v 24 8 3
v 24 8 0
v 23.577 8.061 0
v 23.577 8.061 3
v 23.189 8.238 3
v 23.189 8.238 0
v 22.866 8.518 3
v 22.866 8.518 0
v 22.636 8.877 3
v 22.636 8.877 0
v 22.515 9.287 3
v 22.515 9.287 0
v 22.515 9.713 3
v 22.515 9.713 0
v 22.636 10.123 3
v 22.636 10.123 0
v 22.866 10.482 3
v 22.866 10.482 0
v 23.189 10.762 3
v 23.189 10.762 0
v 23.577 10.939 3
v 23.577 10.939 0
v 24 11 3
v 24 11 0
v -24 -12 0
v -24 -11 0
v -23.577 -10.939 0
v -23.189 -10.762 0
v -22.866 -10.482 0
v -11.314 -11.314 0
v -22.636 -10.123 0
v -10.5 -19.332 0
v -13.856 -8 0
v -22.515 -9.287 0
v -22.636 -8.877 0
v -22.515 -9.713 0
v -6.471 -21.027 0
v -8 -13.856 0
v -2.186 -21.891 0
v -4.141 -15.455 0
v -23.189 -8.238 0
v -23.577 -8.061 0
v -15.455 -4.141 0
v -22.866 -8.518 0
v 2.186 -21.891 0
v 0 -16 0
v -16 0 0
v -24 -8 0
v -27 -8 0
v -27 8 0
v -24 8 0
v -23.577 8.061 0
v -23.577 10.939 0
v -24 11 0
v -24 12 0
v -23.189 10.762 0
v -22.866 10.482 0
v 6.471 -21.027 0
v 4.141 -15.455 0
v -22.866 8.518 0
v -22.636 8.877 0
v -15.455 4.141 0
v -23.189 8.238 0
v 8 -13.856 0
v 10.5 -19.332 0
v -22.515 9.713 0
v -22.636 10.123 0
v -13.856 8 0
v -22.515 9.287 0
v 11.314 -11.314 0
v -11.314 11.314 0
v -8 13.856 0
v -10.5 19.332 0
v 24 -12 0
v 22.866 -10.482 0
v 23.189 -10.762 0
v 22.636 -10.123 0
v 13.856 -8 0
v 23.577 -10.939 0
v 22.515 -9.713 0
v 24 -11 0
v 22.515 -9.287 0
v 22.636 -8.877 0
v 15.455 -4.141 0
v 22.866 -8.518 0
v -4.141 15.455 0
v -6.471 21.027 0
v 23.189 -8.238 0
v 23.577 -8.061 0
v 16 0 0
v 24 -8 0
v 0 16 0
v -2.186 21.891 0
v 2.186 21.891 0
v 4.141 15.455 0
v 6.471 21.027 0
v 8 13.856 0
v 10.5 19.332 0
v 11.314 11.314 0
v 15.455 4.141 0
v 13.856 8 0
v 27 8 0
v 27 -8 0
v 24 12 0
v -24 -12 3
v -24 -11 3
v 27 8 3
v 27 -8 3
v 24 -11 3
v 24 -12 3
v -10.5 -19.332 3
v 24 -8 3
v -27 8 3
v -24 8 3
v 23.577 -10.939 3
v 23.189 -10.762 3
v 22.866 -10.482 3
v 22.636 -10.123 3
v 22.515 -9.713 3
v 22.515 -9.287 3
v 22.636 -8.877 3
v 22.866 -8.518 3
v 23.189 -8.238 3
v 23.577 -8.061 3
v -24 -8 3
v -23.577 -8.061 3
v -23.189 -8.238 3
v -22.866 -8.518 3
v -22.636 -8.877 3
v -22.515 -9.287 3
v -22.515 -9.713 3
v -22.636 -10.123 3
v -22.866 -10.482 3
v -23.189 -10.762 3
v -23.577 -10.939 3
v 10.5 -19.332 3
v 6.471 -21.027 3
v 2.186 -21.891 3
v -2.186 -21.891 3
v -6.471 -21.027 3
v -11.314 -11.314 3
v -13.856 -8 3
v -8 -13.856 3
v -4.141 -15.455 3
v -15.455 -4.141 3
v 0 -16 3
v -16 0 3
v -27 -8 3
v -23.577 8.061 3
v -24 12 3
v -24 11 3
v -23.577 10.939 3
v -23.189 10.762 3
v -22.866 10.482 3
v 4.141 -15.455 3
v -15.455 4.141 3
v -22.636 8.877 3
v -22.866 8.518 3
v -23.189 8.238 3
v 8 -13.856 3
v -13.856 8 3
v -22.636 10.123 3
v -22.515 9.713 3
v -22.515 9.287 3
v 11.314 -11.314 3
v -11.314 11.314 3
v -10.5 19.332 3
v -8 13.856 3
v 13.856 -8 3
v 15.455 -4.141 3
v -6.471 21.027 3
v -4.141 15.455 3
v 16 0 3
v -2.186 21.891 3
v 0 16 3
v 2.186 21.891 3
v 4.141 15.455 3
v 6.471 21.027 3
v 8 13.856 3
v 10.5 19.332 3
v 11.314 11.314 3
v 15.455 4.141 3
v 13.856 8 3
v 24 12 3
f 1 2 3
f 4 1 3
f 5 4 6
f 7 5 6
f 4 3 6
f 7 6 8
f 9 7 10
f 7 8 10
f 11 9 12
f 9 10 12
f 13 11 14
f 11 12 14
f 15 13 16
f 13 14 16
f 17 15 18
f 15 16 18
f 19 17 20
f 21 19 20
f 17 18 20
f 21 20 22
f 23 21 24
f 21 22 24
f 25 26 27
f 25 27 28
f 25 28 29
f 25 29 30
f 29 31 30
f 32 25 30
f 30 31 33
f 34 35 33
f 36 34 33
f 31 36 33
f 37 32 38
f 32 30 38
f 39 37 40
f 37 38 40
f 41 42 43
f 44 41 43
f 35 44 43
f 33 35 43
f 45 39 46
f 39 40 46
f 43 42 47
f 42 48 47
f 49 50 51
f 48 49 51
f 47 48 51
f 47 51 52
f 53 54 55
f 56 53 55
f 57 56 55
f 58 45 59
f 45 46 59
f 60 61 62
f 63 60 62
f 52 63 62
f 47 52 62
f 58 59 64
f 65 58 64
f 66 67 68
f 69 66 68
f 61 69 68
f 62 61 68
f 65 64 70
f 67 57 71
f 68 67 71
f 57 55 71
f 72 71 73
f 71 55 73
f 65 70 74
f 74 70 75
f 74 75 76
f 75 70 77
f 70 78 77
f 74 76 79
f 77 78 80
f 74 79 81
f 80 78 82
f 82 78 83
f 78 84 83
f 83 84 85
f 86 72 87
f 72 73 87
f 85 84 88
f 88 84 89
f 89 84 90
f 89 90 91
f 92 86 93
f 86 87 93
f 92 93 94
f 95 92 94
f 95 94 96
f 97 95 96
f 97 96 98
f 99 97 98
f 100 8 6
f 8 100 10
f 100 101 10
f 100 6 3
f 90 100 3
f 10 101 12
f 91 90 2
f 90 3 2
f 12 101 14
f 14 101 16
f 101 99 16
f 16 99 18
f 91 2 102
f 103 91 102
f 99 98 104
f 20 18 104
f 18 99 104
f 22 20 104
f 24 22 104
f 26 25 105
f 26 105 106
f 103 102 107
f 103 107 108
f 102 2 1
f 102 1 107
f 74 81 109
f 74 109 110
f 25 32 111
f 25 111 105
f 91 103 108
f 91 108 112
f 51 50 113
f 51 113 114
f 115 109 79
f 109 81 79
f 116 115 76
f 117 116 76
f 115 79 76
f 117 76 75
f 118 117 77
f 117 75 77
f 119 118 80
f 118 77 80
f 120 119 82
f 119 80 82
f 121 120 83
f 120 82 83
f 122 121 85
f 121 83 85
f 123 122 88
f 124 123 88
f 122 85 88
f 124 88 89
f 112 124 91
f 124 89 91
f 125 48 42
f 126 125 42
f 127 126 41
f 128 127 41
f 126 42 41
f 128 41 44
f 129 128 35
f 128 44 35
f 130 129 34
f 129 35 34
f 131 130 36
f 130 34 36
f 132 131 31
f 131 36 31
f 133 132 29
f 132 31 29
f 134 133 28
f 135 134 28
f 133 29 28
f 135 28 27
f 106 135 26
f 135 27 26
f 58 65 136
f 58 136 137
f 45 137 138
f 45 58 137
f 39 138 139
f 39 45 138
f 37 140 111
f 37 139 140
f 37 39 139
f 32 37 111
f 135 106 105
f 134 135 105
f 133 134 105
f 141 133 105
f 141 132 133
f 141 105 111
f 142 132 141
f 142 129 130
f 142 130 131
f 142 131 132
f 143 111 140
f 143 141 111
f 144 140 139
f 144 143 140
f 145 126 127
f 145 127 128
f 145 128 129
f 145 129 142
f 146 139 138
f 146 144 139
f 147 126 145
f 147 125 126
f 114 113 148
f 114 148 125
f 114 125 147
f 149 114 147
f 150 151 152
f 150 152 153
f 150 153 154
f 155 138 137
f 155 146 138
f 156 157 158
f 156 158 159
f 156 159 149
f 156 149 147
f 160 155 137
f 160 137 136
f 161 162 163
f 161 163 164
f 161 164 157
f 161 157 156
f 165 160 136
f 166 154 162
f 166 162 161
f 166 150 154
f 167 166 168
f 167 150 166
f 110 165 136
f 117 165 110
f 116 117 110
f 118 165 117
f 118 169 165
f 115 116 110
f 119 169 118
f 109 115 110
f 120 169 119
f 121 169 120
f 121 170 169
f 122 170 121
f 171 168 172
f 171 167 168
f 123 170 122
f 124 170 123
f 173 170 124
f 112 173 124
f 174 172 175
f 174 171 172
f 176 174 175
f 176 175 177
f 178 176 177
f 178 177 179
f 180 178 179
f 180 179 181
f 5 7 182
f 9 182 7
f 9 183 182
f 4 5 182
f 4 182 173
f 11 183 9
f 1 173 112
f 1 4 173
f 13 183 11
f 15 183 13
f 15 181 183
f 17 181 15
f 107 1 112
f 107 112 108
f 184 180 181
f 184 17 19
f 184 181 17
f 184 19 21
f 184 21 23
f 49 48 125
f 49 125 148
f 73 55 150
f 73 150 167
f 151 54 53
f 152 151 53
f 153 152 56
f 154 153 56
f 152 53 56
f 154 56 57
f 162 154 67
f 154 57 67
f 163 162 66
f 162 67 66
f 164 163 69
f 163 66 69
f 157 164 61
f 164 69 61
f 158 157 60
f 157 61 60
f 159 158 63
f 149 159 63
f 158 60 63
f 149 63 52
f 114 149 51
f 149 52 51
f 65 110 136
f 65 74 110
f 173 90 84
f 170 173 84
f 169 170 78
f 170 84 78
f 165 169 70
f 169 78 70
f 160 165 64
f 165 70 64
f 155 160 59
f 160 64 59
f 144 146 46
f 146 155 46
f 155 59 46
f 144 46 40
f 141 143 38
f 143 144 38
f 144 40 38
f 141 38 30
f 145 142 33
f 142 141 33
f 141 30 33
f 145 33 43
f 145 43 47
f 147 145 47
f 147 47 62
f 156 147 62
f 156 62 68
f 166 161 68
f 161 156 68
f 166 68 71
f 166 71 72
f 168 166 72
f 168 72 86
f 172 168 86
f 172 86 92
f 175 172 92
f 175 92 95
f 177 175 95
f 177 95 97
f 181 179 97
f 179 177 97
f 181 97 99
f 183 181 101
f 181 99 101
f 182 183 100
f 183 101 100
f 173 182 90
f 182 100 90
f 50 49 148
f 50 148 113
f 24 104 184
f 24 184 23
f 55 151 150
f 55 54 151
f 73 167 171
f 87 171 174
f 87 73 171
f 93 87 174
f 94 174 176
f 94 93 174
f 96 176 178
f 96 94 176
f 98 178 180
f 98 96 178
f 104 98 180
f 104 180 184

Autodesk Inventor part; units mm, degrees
ref_plane "YZ Plane" through (0, 0, 0) normal (1, 0, 0) x (0, 1, 0)
ref_plane "XZ Plane" through (0, 0, 0) normal (0, 1, 0) x (-1, 0, 0)
ref_plane "XY Plane" through (0, 0, 0) normal (0, 0, 1) x (1, 0, 0)
sketch "スケッチ1" plane through (0, 0, 0) normal (0, 0, 1) x (1, 0, 0)
  circle A0 centre (0, 0) radius 16
  circle A1 centre (0, 0) radius 22
  dimension "d0" = 32
  dimension "d7" = 6
extrude "押し出し1" add sketch "スケッチ1" along normal blind 3
sketch "スケッチ2" plane through (0, 0, 0) normal (0, 0, -1) x (-1, 0, 0)
  line L0 (-27, 8) -> (-27, -8)
  line L1 (27, -8) -> (27, 8)
  line L2 (24, -8) -> (27, -8)
  line L3 (-27, -8) -> (-24, -8)
  line L4 (-24, 8) -> (-27, 8)
  line L5 (27, 8) -> (24, 8)
  line L6 (-24, 12) -> (-24, 11)
  line L7 (-24, -11) -> (-24, -12)
  line L8 (24, -12) -> (24, -11)
  line L9 (24, 11) -> (24, 12)
  line L10 (-24, -12) -> (-10.5005, -19.3323)
  line L11 (10.5005, -19.3323) -> (24, -12)
  line L12 (24, 12) -> (10.5005, 19.3323)
  line L13 (-10.5005, 19.3323) -> (-24, 12)
  circle A0 centre (0, 0) radius 22 projected
  arc A1 (24, -8) -> (24, -11) centre (24, -9.5) ccw
  arc A2 (24, 11) -> (24, 8) centre (24, 9.5) ccw
  arc A3 (-24, 8) -> (-24, 11) centre (-24, 9.5) ccw
  arc A4 (-24, -11) -> (-24, -8) centre (-24, -9.5) ccw
  point P0 (-27, 0)
  point P1 (27, 0)
  dimension "d10" = 54
  dimension "d11" = 16
  dimension "d13" = 48
  dimension "d14" = 24
  dimension "d17" = 3
extrude "押し出し2" add sketch "スケッチ2" against normal blind 3 contours L4 A3 L6 L13 A0 L10 L7 A4 L3 L0 | L12 L9 A2 L5 L1 L2 A1 L8 L11 A0
properties part number "RS555-71K_MotorsupportPolica" material "ポリカーボネート、クリア"
